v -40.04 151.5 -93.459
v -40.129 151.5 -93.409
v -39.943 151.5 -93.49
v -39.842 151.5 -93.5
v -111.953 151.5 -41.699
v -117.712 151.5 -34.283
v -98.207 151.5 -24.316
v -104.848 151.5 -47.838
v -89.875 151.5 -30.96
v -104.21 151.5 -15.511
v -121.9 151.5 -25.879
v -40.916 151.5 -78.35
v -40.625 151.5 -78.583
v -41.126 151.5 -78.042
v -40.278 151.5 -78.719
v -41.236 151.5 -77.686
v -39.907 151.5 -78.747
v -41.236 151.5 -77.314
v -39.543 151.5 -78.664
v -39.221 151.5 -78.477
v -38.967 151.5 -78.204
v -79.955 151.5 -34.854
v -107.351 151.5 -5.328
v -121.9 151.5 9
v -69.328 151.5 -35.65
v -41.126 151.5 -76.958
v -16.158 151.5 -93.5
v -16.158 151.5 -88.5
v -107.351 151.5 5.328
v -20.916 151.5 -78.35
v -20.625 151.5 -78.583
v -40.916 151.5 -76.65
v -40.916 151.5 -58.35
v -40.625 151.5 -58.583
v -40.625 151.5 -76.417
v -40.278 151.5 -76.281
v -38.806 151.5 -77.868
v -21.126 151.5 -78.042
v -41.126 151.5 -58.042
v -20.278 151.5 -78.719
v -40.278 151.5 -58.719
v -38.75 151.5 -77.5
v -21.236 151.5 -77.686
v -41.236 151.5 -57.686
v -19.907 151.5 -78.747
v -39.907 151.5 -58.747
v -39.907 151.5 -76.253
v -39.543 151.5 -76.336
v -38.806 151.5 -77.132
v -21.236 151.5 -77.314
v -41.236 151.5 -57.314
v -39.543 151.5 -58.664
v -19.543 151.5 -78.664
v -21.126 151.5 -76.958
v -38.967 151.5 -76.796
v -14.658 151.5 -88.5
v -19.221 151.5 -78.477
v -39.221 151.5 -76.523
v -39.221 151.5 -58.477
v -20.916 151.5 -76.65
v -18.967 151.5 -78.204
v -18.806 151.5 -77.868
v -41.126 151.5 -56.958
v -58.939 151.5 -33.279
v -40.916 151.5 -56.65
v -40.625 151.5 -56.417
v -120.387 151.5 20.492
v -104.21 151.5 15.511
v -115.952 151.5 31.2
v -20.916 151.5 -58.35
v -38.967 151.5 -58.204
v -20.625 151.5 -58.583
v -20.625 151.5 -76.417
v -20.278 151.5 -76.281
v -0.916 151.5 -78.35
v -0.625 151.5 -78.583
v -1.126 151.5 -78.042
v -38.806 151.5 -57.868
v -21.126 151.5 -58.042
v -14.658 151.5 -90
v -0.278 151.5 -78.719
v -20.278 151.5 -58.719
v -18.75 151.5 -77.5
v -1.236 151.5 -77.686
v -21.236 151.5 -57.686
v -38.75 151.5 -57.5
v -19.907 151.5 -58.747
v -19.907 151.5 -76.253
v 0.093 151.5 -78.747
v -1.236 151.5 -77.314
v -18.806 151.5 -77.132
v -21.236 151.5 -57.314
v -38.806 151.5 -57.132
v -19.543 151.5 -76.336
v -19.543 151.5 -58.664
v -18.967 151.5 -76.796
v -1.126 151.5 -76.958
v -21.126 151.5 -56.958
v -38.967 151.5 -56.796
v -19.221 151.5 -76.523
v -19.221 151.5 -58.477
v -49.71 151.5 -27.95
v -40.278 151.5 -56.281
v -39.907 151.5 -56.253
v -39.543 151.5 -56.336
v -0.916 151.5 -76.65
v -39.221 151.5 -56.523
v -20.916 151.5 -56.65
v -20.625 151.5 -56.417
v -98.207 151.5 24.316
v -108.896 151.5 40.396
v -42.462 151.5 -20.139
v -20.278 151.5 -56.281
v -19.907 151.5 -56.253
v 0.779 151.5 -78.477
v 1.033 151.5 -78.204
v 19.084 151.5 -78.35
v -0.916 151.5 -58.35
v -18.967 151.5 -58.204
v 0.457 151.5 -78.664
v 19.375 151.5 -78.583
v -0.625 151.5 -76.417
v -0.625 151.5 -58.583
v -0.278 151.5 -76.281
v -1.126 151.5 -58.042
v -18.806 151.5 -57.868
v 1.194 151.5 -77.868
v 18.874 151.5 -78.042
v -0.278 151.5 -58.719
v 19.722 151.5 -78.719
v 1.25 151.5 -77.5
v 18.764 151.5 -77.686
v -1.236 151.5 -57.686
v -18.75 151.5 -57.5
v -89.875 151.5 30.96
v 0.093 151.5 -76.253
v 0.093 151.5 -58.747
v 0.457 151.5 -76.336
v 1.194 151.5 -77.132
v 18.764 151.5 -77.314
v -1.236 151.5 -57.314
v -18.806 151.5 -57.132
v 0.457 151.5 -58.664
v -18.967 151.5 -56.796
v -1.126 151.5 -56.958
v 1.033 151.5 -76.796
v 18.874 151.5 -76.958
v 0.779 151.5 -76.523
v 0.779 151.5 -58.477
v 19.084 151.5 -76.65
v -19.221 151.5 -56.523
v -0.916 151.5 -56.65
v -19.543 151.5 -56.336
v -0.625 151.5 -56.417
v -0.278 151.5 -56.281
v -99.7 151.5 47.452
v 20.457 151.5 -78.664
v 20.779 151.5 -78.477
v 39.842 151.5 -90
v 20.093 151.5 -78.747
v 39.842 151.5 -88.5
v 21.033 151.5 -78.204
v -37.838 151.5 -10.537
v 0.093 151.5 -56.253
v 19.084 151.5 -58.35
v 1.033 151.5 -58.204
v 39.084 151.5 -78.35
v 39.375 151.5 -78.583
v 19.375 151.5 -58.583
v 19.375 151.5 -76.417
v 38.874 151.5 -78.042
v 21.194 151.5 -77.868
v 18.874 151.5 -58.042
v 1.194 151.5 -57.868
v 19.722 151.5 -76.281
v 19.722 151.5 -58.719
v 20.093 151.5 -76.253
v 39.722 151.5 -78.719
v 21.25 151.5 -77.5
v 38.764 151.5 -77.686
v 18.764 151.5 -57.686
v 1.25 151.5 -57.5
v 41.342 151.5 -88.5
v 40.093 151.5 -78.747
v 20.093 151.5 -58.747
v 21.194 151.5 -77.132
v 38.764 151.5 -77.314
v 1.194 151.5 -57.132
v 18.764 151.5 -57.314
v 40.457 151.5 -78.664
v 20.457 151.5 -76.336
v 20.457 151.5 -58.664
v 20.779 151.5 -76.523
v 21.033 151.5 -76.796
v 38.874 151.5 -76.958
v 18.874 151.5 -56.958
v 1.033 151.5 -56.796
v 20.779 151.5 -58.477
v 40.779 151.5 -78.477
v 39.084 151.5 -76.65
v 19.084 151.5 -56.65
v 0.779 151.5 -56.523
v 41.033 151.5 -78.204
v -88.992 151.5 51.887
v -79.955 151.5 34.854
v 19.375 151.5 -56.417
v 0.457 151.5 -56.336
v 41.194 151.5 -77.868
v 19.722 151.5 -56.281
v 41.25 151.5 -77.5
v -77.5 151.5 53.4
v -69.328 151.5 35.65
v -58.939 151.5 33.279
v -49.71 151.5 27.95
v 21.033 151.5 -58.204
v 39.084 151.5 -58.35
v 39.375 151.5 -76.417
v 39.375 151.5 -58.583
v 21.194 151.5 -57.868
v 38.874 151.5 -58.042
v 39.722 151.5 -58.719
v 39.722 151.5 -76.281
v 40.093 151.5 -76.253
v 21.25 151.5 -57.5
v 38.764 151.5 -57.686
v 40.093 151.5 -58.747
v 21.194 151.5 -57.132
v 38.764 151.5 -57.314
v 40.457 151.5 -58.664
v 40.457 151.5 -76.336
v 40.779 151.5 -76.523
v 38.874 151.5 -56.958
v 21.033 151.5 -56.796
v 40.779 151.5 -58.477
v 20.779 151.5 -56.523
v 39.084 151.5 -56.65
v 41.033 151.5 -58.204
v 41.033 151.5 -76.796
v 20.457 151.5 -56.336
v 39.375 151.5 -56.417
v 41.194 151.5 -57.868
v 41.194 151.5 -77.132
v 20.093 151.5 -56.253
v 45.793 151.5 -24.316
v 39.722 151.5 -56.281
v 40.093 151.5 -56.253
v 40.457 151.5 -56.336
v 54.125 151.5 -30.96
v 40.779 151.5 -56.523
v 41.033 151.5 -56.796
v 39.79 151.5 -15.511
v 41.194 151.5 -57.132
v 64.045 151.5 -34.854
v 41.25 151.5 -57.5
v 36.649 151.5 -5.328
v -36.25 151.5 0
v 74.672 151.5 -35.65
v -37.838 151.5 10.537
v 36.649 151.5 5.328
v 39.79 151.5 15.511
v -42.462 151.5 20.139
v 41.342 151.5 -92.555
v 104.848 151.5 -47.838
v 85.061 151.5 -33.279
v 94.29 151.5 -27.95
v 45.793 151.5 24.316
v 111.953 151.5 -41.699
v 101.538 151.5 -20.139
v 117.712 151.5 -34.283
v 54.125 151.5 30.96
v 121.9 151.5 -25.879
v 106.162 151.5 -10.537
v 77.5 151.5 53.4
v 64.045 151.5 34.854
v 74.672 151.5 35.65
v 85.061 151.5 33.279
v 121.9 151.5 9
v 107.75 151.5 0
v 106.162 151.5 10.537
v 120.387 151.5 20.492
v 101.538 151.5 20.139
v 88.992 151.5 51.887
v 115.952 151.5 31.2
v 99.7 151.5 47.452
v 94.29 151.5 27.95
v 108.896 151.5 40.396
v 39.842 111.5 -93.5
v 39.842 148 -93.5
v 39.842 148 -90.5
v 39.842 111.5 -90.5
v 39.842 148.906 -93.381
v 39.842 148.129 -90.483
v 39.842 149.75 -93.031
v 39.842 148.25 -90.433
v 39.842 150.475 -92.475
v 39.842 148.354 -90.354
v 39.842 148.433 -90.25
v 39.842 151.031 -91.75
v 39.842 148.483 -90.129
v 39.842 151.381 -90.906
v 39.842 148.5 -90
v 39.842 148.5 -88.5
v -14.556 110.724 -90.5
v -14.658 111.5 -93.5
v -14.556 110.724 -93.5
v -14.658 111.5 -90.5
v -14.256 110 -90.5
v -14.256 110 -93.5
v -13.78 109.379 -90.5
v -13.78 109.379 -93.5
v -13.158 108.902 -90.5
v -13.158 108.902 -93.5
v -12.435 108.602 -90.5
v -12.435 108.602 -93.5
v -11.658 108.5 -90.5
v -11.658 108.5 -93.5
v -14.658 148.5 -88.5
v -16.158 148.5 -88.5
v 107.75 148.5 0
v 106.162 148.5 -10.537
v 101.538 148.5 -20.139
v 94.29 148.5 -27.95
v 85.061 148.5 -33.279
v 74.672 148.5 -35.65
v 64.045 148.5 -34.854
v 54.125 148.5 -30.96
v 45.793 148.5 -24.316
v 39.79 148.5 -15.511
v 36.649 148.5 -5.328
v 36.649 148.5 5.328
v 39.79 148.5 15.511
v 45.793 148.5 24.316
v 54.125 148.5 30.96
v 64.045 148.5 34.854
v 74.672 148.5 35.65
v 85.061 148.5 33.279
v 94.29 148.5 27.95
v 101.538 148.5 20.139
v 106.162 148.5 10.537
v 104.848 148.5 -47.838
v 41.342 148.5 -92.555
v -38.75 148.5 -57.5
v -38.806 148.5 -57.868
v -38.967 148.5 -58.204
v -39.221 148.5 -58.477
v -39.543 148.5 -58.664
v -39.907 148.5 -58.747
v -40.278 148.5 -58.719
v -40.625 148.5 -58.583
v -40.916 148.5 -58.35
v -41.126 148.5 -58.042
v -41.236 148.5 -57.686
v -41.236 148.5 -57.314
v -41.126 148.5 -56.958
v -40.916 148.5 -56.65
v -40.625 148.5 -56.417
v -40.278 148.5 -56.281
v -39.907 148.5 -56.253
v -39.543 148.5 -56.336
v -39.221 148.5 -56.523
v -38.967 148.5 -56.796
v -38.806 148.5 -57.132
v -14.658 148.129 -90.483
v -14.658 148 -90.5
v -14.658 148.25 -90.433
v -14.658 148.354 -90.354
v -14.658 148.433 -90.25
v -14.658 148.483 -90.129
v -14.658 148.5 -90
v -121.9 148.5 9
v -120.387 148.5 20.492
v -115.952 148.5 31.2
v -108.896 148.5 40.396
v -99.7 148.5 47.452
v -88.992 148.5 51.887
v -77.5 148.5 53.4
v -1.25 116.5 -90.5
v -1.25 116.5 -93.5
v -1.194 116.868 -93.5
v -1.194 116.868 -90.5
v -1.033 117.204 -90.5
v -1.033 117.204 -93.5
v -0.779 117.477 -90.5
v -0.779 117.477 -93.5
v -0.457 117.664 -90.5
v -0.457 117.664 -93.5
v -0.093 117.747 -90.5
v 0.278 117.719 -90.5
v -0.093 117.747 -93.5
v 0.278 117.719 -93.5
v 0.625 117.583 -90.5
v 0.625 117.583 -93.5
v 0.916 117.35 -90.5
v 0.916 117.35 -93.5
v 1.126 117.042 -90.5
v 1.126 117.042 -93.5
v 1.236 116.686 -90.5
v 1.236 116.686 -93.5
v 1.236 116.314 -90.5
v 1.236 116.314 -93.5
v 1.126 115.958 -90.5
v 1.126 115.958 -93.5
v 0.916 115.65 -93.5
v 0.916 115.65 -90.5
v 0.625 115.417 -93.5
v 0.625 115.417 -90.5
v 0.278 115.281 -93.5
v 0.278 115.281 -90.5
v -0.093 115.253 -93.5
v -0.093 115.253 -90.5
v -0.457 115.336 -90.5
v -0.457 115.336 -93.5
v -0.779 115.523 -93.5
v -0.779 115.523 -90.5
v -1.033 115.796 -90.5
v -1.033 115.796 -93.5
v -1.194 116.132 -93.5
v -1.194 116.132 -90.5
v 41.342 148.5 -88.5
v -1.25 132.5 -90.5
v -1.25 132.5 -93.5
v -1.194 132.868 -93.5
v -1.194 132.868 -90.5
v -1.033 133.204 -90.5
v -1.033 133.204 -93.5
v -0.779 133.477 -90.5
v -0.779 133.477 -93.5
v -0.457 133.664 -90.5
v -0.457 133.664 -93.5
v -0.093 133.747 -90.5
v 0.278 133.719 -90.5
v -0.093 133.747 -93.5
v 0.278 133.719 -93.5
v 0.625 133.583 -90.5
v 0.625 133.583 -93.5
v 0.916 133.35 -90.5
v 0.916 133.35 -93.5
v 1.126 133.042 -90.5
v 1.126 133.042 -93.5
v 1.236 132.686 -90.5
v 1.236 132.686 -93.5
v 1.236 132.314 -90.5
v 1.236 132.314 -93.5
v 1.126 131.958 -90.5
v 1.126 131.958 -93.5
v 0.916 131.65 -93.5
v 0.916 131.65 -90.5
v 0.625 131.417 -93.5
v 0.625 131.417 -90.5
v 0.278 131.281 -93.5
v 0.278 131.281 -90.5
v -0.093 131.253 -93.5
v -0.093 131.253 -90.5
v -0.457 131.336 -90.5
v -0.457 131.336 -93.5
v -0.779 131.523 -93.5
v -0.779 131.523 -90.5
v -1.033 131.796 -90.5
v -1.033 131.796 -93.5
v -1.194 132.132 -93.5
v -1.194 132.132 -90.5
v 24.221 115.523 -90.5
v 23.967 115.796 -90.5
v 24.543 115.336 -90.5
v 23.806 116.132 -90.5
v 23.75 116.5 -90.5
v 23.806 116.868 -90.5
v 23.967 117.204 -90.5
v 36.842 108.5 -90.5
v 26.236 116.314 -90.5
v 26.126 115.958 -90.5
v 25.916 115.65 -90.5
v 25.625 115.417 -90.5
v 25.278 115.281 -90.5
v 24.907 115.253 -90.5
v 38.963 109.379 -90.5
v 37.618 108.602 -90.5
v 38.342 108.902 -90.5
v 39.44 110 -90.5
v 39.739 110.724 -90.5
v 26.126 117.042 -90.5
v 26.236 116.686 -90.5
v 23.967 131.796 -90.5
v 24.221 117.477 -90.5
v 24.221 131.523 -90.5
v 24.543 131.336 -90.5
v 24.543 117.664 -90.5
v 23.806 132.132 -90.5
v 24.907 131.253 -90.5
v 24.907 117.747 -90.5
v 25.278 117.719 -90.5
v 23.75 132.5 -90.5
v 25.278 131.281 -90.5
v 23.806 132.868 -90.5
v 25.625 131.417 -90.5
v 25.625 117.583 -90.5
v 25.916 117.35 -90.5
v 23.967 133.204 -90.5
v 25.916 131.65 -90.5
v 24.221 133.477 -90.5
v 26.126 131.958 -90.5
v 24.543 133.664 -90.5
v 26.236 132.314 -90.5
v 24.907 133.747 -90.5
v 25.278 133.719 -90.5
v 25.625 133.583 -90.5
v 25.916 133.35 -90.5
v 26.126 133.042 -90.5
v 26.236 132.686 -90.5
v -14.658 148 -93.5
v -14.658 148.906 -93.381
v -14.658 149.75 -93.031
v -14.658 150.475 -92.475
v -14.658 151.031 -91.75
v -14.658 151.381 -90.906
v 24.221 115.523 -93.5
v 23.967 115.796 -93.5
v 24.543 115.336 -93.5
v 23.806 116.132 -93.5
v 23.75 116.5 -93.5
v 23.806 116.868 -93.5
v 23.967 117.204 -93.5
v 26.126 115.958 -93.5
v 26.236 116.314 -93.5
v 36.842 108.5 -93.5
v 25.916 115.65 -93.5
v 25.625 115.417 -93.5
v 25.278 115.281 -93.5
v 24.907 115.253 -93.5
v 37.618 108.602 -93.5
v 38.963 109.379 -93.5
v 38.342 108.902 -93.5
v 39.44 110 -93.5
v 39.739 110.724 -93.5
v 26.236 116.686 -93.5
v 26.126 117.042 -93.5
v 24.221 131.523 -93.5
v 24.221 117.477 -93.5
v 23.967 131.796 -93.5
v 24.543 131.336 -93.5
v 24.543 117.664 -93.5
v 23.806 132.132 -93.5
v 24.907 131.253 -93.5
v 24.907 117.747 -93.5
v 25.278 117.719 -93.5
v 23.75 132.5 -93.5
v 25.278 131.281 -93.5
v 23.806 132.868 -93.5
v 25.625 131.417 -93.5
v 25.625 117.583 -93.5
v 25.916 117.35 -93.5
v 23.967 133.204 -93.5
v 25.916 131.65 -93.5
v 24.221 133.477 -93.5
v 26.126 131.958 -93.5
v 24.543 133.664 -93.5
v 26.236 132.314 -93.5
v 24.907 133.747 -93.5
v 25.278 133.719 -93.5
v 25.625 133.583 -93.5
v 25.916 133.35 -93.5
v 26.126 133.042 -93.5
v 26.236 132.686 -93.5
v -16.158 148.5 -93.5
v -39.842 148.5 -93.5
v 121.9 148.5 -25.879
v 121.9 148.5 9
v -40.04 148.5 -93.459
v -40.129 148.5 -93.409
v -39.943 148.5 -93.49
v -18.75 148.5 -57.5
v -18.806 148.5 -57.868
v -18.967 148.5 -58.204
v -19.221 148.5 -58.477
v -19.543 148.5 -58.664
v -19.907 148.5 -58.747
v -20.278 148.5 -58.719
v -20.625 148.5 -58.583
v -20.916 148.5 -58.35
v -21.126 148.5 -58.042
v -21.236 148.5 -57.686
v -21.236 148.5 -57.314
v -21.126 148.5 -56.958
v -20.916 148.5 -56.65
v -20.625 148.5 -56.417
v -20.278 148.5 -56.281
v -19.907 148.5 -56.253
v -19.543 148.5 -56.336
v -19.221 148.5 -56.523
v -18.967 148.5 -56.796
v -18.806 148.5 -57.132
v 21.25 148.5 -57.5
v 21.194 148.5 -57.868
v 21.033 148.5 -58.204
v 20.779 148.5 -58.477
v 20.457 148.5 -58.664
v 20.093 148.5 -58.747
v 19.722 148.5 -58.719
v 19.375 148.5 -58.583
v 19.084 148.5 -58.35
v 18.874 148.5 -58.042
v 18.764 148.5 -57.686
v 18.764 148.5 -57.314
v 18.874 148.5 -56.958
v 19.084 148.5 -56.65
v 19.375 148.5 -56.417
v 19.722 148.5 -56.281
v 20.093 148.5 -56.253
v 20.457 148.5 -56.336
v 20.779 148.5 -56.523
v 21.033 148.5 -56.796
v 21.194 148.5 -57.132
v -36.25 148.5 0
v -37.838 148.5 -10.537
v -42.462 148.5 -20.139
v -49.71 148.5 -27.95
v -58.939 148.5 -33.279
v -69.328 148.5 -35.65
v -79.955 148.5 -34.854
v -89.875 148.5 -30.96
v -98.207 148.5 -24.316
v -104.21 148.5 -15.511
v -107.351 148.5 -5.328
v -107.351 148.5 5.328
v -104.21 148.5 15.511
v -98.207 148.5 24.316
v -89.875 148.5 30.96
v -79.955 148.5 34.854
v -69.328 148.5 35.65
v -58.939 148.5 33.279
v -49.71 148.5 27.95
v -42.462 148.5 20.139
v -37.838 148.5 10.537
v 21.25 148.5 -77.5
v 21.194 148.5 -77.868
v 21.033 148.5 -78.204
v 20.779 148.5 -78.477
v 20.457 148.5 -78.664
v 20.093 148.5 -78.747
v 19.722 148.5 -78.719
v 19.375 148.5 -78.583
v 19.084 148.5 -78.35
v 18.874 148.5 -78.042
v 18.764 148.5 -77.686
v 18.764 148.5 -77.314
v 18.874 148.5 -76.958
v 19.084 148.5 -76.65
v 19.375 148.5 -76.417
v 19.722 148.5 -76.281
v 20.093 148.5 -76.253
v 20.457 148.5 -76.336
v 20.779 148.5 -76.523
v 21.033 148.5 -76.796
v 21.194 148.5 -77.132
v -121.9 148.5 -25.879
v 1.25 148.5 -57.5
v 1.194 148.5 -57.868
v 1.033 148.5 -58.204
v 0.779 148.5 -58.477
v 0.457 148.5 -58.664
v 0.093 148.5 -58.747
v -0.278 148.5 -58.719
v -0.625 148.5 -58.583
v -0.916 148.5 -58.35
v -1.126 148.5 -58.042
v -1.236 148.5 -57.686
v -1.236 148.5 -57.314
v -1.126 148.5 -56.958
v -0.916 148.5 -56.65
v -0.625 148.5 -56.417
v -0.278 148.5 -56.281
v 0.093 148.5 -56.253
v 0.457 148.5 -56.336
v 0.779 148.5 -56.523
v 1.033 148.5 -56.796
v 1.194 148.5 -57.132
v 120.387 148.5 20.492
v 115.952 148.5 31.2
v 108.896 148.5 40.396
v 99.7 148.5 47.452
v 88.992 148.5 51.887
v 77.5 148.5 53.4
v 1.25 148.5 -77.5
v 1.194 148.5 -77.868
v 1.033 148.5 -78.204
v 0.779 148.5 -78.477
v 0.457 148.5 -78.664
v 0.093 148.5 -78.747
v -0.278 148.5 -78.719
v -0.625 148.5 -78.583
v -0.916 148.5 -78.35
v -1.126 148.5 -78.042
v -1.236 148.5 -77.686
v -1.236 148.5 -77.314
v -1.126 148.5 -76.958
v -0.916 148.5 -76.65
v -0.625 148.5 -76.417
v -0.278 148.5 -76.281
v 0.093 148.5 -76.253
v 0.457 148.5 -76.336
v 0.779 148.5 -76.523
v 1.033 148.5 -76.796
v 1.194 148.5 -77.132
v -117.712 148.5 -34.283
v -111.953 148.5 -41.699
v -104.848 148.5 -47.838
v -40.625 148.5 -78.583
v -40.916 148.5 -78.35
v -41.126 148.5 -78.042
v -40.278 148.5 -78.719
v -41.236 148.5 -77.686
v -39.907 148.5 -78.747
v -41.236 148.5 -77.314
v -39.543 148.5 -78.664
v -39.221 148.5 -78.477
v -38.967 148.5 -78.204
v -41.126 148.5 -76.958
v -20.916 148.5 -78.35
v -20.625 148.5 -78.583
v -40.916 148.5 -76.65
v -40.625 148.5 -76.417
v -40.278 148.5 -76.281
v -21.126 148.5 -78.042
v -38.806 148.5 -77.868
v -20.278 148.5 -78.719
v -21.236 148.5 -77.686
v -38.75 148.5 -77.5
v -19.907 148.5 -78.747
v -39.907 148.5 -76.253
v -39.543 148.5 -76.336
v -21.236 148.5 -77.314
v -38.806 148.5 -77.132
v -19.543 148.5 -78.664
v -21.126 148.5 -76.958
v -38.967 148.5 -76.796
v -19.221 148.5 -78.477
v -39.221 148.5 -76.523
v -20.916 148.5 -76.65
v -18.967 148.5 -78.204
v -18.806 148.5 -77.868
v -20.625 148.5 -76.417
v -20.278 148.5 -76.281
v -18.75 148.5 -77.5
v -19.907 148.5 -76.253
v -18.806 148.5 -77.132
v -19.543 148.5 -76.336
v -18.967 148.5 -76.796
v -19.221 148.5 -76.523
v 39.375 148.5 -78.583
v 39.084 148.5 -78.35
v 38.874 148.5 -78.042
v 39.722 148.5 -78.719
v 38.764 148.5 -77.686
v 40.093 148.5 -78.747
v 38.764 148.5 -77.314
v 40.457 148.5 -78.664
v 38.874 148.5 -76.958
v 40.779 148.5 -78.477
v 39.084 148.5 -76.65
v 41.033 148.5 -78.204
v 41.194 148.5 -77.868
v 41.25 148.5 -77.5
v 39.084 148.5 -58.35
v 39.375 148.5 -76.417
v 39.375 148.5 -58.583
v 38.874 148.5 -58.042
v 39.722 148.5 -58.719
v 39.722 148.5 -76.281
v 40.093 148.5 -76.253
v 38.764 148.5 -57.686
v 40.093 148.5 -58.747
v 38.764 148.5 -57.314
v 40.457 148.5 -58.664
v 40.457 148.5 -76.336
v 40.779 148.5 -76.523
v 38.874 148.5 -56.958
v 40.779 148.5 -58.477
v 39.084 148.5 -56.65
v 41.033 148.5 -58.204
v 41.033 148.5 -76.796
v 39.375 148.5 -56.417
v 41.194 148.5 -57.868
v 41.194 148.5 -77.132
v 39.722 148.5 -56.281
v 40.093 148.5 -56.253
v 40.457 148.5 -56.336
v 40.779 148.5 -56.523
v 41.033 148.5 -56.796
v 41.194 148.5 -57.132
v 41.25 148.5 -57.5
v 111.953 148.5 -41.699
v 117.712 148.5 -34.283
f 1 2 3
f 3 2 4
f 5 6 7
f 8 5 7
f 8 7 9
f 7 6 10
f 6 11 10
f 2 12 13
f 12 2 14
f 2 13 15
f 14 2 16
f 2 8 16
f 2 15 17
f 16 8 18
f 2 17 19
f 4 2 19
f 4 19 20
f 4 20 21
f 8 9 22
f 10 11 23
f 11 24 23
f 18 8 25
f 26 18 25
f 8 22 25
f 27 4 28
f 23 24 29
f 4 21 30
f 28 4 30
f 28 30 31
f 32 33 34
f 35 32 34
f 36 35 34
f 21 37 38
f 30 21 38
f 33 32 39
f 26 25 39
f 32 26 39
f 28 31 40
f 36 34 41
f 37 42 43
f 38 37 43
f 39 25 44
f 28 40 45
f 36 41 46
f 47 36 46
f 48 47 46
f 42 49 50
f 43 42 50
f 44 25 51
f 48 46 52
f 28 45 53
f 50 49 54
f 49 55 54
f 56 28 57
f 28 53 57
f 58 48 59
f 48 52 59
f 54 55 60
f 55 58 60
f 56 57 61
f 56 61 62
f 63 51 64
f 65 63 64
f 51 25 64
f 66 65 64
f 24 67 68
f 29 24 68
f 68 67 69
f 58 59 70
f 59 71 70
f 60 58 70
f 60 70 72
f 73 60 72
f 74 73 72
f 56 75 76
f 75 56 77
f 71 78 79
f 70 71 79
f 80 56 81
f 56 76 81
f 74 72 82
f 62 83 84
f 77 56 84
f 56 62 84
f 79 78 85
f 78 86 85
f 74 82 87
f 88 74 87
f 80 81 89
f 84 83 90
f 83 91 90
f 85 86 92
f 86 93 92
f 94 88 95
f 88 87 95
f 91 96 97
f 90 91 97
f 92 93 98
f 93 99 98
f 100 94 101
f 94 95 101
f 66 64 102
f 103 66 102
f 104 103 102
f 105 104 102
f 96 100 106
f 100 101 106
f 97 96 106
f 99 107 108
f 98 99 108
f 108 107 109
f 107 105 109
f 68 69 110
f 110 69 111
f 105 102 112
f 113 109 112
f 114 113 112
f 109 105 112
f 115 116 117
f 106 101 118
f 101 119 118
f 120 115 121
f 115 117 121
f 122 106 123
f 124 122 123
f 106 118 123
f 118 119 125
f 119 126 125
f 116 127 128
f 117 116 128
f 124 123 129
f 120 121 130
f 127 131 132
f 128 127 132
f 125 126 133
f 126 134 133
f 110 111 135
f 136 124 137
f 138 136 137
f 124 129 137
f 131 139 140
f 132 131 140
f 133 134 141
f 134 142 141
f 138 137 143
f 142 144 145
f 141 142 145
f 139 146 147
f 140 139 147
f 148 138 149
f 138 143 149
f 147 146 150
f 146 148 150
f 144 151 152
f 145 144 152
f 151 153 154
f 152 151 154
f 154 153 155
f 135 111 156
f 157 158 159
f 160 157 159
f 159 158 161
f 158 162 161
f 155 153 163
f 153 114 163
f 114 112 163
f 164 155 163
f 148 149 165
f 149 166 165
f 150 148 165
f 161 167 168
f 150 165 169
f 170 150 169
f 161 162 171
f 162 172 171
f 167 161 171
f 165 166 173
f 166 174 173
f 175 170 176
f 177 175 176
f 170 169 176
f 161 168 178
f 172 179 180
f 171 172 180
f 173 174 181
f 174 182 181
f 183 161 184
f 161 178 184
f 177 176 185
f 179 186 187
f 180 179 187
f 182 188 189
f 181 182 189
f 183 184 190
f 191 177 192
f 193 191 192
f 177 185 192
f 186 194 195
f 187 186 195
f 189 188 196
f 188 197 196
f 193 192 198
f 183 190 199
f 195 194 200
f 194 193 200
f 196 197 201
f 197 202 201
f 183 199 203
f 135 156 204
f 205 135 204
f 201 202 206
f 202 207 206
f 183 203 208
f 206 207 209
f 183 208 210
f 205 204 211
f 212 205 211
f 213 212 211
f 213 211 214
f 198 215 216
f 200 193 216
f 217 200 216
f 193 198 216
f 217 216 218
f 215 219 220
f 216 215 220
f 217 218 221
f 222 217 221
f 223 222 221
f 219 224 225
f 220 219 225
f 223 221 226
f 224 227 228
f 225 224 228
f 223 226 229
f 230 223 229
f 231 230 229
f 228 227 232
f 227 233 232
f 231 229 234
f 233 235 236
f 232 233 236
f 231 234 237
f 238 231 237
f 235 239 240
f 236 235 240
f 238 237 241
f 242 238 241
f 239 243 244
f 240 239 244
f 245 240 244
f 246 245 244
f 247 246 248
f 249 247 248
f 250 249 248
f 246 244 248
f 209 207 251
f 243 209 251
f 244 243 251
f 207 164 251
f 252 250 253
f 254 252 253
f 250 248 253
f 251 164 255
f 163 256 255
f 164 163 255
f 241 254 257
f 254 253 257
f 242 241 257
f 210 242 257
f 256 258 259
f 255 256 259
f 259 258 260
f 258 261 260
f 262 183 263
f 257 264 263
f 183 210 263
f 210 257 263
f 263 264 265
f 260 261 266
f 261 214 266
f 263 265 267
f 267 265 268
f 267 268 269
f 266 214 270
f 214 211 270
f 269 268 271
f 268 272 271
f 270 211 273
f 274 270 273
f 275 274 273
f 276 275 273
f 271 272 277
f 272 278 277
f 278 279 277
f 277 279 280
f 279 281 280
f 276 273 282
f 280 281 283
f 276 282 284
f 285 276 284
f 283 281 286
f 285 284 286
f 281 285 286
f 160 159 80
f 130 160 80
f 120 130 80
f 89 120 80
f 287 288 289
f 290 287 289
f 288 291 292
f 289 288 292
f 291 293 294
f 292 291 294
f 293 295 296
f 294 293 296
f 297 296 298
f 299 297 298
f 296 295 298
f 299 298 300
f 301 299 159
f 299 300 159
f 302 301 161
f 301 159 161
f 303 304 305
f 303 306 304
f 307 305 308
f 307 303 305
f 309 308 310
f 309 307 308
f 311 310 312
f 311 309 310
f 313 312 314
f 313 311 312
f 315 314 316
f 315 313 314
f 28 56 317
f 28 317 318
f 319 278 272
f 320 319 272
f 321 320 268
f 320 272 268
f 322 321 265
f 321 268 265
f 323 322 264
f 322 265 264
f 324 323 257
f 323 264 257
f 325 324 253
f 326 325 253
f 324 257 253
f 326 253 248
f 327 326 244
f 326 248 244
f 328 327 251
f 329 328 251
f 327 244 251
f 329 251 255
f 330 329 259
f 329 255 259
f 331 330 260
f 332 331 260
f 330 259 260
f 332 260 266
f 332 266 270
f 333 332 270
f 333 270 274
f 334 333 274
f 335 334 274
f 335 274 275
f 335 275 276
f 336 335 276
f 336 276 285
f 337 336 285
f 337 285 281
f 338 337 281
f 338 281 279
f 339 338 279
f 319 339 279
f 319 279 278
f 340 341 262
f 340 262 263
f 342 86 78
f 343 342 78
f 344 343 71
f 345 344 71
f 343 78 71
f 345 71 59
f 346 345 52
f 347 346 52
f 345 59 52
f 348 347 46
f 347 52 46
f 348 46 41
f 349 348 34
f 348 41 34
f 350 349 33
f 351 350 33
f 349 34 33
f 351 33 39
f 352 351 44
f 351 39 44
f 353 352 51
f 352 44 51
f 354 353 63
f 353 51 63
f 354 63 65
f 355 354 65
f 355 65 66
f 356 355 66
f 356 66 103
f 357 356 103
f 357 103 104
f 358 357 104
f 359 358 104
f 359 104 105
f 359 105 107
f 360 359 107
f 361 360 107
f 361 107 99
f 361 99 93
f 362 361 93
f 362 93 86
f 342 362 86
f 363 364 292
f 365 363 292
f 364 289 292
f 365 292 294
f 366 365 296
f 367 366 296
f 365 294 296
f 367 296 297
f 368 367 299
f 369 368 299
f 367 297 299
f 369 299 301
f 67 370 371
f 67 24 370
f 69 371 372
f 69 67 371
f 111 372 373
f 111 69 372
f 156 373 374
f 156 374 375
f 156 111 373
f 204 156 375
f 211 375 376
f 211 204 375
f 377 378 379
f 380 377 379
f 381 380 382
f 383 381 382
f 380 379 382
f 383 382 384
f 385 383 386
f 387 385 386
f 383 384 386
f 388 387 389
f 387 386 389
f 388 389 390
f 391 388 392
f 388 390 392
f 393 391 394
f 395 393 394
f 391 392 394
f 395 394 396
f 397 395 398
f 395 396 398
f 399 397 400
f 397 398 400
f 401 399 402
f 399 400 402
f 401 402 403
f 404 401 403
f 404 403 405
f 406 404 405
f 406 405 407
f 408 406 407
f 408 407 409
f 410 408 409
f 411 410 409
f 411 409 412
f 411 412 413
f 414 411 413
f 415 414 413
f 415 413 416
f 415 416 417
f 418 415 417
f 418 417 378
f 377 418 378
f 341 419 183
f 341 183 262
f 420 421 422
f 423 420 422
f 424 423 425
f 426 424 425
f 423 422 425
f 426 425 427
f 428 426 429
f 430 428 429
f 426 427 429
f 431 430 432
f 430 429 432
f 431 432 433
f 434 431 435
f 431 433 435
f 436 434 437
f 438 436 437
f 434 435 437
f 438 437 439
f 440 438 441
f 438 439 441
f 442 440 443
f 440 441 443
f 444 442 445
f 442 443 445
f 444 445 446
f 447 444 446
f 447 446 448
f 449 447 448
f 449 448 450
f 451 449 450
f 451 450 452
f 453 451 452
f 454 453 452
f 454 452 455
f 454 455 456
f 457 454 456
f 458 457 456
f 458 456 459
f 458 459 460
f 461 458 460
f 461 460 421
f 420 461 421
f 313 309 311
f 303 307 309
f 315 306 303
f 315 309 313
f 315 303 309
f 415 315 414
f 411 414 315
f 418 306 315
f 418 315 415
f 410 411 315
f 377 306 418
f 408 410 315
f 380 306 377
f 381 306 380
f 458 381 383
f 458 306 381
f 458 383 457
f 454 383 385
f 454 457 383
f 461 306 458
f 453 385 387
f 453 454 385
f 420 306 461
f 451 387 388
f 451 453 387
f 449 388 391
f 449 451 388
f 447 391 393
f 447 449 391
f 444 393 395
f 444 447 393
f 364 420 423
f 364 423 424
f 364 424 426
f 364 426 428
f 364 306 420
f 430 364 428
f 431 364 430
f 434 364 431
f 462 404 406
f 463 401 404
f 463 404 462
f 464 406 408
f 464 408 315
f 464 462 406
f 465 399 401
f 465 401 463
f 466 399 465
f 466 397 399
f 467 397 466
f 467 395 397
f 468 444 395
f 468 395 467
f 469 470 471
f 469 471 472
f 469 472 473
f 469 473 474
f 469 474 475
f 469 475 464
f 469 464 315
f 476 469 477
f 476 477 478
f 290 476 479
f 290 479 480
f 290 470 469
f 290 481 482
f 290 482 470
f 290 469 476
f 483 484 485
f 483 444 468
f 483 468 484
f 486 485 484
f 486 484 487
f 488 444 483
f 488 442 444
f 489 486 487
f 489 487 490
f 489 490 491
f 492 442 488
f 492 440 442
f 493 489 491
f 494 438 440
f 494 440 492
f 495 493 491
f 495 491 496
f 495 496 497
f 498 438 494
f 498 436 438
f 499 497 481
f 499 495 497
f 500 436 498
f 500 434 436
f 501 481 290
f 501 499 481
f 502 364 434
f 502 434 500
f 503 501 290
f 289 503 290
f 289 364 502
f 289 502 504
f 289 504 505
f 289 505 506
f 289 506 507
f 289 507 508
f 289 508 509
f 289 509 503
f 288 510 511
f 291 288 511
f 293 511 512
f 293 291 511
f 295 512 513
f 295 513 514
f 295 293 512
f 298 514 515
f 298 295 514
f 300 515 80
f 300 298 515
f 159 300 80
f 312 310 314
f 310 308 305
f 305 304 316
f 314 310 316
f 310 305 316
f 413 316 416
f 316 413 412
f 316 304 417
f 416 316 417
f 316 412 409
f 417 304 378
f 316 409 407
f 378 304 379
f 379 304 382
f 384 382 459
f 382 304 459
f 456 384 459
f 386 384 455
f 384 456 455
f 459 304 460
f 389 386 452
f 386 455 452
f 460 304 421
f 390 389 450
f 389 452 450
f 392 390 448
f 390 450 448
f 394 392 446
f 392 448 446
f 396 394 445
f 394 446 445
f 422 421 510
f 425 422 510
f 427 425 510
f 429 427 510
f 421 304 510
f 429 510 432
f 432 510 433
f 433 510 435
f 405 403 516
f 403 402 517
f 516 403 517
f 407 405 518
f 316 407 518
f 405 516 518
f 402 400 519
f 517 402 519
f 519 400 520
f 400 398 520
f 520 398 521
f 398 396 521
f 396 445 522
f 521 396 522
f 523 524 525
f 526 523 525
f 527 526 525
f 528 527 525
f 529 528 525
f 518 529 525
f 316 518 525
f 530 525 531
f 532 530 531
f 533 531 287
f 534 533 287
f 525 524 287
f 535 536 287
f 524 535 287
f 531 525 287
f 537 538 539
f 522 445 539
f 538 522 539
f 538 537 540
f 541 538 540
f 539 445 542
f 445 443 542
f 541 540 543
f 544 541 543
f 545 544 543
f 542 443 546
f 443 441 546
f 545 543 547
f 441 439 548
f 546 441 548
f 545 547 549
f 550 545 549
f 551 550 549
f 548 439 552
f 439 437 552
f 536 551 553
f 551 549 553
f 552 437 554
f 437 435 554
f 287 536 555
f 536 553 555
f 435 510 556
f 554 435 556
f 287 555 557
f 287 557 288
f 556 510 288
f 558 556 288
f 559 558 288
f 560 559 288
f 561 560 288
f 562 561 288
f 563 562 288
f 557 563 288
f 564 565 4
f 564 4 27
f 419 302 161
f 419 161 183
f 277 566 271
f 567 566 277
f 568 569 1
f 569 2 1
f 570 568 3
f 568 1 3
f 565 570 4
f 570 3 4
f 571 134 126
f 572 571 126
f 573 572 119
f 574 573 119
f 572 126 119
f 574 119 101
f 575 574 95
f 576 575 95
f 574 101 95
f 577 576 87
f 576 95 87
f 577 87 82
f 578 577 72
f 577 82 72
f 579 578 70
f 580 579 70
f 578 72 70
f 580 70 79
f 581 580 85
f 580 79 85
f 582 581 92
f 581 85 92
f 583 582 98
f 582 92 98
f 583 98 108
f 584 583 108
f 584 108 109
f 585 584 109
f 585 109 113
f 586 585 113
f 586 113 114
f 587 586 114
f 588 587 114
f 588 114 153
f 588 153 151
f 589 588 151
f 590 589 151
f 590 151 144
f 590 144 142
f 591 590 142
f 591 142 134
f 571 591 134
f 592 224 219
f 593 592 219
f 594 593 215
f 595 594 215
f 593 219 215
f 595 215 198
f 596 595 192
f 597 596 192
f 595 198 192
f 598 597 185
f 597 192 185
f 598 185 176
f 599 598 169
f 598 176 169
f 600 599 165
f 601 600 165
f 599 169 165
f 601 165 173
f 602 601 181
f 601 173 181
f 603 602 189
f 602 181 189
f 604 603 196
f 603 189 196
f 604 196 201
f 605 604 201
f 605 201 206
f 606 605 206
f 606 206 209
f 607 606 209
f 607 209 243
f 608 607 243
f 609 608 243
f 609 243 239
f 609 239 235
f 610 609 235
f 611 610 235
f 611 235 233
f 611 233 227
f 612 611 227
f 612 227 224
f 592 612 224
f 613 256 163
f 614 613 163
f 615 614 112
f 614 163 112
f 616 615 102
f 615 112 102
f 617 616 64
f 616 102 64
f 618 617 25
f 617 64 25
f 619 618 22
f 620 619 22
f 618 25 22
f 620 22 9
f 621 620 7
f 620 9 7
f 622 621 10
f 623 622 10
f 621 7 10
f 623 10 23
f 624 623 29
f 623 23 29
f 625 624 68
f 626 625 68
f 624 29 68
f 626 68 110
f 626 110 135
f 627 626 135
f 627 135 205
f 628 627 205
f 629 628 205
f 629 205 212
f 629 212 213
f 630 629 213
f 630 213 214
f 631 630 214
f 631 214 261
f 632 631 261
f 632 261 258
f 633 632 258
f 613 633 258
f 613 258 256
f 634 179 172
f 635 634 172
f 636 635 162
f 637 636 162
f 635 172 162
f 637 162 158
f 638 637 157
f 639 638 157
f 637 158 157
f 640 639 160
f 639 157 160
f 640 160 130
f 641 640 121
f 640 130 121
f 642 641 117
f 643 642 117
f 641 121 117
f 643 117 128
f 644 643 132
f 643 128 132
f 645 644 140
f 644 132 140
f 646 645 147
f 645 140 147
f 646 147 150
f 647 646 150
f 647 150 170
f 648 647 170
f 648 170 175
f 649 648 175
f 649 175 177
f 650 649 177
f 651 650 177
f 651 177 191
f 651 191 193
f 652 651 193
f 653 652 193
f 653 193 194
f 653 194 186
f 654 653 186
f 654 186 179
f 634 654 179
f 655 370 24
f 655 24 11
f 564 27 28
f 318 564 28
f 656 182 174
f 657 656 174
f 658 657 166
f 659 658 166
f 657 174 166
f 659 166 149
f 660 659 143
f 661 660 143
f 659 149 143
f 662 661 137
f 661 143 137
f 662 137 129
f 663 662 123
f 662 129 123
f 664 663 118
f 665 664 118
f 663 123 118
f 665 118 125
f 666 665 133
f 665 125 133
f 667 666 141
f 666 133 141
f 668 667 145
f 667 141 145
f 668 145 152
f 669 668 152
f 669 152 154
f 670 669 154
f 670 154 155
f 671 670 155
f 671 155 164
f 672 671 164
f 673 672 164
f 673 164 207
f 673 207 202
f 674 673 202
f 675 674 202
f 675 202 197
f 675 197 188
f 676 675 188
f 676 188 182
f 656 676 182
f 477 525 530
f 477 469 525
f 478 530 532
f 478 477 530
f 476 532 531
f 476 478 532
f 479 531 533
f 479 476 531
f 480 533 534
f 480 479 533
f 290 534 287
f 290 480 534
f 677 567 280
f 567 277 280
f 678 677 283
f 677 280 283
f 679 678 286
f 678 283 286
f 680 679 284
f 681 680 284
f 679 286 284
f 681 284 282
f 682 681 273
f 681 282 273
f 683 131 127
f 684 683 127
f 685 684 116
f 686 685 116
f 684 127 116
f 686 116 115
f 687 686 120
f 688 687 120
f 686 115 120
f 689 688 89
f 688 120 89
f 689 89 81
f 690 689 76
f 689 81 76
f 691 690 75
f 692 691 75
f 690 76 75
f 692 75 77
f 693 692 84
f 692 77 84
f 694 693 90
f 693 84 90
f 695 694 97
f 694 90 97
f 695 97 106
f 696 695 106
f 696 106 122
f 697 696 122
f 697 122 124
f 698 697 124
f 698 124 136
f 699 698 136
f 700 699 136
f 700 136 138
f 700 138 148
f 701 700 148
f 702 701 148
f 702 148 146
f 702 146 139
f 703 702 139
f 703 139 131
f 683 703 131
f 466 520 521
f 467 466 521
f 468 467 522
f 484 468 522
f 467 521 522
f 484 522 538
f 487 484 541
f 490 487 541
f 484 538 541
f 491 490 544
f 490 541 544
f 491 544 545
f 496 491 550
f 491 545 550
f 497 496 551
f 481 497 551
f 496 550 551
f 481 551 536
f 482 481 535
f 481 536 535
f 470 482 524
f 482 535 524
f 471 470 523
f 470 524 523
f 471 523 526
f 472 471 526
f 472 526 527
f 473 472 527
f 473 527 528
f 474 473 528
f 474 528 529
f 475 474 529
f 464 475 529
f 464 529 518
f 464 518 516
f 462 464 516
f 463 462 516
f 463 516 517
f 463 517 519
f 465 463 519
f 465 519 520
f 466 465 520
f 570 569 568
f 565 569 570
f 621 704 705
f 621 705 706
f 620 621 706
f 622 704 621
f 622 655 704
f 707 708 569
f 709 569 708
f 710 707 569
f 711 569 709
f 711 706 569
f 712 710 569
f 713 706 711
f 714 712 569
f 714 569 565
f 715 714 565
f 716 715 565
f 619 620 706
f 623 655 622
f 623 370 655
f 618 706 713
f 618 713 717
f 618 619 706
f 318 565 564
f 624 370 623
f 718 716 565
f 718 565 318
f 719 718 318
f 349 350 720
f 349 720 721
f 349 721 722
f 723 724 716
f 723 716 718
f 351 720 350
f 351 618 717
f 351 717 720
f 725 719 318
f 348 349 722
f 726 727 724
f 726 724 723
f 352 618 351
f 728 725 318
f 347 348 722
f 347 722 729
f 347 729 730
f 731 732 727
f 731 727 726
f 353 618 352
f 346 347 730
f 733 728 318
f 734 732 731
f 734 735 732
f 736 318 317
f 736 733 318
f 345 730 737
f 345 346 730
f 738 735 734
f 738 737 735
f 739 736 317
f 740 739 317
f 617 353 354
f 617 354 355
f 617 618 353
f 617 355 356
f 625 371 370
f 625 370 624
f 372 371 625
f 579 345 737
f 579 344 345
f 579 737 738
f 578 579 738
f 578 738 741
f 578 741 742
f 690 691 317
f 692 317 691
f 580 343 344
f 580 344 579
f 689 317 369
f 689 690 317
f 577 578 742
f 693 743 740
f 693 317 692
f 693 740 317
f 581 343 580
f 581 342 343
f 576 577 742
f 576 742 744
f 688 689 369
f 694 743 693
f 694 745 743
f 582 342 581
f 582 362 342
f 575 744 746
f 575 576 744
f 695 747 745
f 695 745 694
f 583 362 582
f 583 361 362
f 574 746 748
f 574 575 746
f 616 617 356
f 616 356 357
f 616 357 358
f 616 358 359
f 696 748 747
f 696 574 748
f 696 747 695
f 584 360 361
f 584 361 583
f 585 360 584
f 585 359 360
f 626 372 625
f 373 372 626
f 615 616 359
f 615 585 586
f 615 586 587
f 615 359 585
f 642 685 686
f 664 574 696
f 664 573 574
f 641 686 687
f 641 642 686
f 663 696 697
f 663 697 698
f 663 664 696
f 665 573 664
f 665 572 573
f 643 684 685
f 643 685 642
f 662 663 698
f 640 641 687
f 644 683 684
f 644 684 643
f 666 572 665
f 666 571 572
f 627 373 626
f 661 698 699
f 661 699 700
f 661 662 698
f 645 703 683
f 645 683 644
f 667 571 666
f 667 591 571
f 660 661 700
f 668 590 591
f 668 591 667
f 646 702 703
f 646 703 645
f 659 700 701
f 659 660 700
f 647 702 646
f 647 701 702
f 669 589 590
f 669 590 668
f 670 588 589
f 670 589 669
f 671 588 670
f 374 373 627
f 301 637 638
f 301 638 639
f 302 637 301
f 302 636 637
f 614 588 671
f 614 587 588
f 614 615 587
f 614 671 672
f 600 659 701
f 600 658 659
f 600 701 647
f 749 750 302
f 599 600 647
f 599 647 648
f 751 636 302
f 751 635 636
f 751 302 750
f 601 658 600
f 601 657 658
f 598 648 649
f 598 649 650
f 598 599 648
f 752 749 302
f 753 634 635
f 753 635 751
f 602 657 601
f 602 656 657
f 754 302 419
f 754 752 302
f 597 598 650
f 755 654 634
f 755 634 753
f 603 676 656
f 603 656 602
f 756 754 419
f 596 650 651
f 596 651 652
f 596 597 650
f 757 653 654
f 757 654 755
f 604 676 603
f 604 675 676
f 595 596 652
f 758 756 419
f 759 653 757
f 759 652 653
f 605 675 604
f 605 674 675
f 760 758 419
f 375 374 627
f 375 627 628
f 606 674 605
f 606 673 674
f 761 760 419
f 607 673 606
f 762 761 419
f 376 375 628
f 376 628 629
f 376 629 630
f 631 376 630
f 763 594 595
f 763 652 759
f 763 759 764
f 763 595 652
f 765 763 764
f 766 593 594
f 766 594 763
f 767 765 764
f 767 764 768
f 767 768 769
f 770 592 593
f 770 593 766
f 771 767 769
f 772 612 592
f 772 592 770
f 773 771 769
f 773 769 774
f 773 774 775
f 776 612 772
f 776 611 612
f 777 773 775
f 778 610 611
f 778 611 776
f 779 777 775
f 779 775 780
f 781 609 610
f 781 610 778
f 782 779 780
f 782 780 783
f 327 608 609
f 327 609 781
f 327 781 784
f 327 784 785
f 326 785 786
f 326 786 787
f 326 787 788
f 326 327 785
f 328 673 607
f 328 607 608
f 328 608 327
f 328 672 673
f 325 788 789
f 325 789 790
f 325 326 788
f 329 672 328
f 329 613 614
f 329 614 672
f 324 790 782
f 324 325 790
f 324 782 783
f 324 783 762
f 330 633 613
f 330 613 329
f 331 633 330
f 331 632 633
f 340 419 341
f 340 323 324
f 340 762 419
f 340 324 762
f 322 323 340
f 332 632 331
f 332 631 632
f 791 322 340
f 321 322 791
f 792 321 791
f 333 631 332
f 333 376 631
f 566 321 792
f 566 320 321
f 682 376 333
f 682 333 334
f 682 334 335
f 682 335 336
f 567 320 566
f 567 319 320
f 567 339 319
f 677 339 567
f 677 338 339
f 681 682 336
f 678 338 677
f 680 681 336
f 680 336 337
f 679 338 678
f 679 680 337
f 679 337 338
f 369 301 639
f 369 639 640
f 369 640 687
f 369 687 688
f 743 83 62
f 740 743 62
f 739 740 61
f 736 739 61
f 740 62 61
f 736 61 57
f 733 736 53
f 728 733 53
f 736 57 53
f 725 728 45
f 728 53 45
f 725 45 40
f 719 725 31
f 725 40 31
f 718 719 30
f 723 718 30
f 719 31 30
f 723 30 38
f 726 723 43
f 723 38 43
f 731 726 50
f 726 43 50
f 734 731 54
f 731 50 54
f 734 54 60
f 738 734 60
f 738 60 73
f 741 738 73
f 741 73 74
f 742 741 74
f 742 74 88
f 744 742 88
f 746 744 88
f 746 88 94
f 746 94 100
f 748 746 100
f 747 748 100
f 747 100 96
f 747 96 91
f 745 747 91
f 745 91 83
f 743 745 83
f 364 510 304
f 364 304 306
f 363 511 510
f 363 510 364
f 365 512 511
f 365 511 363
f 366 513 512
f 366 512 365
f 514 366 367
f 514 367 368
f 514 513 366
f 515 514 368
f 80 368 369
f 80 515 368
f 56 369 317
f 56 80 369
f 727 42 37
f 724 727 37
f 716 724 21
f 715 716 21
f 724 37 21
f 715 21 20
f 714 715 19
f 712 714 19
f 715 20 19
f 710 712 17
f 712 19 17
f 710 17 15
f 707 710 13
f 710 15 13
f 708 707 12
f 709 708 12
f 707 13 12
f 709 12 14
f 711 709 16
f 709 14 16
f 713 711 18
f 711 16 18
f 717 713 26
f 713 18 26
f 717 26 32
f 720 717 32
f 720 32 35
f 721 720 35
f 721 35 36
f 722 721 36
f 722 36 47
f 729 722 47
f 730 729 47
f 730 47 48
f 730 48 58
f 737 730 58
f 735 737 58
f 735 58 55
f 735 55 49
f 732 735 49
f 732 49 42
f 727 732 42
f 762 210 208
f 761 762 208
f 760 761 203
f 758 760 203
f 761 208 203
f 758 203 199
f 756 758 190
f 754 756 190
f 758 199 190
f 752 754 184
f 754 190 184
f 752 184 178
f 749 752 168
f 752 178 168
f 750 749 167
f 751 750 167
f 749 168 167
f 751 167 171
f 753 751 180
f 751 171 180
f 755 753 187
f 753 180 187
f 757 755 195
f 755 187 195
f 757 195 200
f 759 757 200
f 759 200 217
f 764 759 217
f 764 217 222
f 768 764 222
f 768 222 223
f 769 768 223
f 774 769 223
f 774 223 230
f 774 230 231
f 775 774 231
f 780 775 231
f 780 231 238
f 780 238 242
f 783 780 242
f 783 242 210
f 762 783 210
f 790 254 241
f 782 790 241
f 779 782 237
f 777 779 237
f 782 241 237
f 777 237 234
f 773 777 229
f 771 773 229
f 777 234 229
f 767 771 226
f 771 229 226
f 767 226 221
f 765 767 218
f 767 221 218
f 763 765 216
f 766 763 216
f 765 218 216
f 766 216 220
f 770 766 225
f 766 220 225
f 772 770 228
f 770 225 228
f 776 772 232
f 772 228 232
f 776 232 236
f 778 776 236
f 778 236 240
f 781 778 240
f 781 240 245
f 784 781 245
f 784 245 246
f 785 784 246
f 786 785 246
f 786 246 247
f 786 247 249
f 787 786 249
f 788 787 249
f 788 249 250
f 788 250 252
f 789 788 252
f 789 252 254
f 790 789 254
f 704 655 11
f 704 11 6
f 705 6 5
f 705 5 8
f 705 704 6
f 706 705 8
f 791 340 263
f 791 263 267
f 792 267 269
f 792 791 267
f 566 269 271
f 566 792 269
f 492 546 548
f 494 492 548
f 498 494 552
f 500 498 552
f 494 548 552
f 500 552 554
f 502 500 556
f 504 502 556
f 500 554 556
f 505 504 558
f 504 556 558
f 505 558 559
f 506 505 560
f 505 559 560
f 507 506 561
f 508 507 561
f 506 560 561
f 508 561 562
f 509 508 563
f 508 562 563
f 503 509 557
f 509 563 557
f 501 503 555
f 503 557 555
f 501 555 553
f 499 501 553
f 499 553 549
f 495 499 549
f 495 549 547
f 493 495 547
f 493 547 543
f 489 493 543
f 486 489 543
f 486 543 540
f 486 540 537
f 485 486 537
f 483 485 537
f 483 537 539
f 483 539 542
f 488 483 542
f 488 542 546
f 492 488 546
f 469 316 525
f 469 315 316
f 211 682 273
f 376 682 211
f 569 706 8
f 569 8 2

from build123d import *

# Parameters (mm, degrees)
EXTRUDE_1_DEPTH         = 3
SKETCH_2_W              = 1.5
SKETCH_2_H              = 5
CUT_EXTRUDE_1_DEPTH     = 154.658257181
SKETCH_3_W              = 54.5
SKETCH_3_H              = 3
EXTRUDE_2_DEPTH         = 40
HOLE_WIZARD_2_5_2_5_1_D = 2.5
HOLE_WIZARD_2_5_2_5_2_D = 2.5
HOLE_WIZARD_M641_D      = 71.5
FILLET_1_R              = 0.5
FILLET_2_R              = 3
FILLET_3_R              = 3.5
FILLET_4_R              = 44.4


with BuildPart() as part:
    # Эскиз1 → Бобышка-Вытянуть1 (new body)
    with BuildSketch(Plane.XZ.offset(-148.5)):
        with BuildLine():
            Line((121.9, -25.878684783), (121.9, 53.4))
            Line((121.9, 53.4), (-121.9, 53.4))
            Line((-121.9, 53.4), (-121.9, -25.878684783))
            ThreePointArc((-121.9, -25.878684783), (-115.016337378, -38.133733536), (-104.847515108, -47.837654634))
            Line((-104.847515108, -47.837654634), (-40, -93.5))
            Line((-40, -93.5), (39.841624635, -93.5))
            Line((39.841624635, -93.5), (39.841624635, -88.5))
            Line((39.841624635, -88.5), (41.341624635, -88.5))
            Line((41.341624635, -88.5), (41.341624635, -92.555295683))
            Line((41.341624635, -92.555295683), (104.847515108, -47.837654634))
            ThreePointArc((104.847515108, -47.837654634), (115.016337378, -38.133733536), (121.9, -25.878684783))
        make_face()
    extrude(amount=-EXTRUDE_1_DEPTH)

    # Эскиз2 → Вырез-Вытянуть1 (cut, through all)
    with BuildSketch(Plane(origin=(0, 151.5, 0), x_dir=(-1, 0, 0), z_dir=(0, 1, 0))):
        with Locations((15.408375365, -91)):
            Rectangle(SKETCH_2_W, SKETCH_2_H)
    extrude(amount=-CUT_EXTRUDE_1_DEPTH, mode=Mode.SUBTRACT)

    # Эскиз3 → Бобышка-Вытянуть2 (add)
    with BuildSketch(Plane.XZ.offset(-148.5)):
        with Locations((12.591624635, -92)):
            Rectangle(SKETCH_3_W, SKETCH_3_H)
    extrude(amount=EXTRUDE_2_DEPTH)

    # Диаметр отверстия Ø2.5 (2.5)1 (through all)
    with Locations(Plane(origin=(0, 148.5, 0), x_dir=(-1, 0, 0), z_dir=(0, -1, 0))):
        with Locations((40, 57.5), (40, 77.5), (20, 57.5), (20, 77.5), (-40, 57.5), (-40, 77.5), (-20, 57.5), (-20, 77.5), (0, 57.5), (0, 77.5)):
            Hole(HOLE_WIZARD_2_5_2_5_1_D / 2)

    # Диаметр отверстия Ø2.5 (2.5)2 (through all)
    with Locations(Plane.XY.offset(-90.5)):
        with Locations((25, 116.5), (25, 132.5), (0, 116.5), (0, 132.5)):
            Hole(HOLE_WIZARD_2_5_2_5_2_D / 2)

    # Отверстие с зазором M641 (through all)
    with Locations(Plane(origin=(0, 148.5, 0), x_dir=(-1, 0, 0), z_dir=(0, -1, 0))):
        with Locations((72, 0), (-72, 0)):
            Hole(HOLE_WIZARD_M641_D / 2)

    # Скругление1
    fillet_1_edges = [part.edges().sort_by_distance(p)[0] for p in [
        (-40, 150, -93.5),
        (12.591624635, 148.5, -90.5),
    ]]
    fillet(fillet_1_edges, radius=FILLET_1_R)

    # Скругление2
    fillet_2_edges = [part.edges().sort_by_distance(p)[0] for p in [
        (-14.658375365, 108.5, -92),
        (39.841624635, 108.5, -92),
    ]]
    fillet(fillet_2_edges, radius=FILLET_2_R)

    # Скругление3
    fillet_3_edges = [part.edges().sort_by_distance(p)[0] for p in [
        (12.591624635, 151.5, -93.5),
    ]]
    fillet(fillet_3_edges, radius=FILLET_3_R)

    # Скругление4
    fillet_4_edges = [part.edges().sort_by_distance(p)[0] for p in [
        (-121.9, 150, 53.4),
        (121.9, 150, 53.4),
    ]]
    fillet(fillet_4_edges, radius=FILLET_4_R)


solid = part.part
